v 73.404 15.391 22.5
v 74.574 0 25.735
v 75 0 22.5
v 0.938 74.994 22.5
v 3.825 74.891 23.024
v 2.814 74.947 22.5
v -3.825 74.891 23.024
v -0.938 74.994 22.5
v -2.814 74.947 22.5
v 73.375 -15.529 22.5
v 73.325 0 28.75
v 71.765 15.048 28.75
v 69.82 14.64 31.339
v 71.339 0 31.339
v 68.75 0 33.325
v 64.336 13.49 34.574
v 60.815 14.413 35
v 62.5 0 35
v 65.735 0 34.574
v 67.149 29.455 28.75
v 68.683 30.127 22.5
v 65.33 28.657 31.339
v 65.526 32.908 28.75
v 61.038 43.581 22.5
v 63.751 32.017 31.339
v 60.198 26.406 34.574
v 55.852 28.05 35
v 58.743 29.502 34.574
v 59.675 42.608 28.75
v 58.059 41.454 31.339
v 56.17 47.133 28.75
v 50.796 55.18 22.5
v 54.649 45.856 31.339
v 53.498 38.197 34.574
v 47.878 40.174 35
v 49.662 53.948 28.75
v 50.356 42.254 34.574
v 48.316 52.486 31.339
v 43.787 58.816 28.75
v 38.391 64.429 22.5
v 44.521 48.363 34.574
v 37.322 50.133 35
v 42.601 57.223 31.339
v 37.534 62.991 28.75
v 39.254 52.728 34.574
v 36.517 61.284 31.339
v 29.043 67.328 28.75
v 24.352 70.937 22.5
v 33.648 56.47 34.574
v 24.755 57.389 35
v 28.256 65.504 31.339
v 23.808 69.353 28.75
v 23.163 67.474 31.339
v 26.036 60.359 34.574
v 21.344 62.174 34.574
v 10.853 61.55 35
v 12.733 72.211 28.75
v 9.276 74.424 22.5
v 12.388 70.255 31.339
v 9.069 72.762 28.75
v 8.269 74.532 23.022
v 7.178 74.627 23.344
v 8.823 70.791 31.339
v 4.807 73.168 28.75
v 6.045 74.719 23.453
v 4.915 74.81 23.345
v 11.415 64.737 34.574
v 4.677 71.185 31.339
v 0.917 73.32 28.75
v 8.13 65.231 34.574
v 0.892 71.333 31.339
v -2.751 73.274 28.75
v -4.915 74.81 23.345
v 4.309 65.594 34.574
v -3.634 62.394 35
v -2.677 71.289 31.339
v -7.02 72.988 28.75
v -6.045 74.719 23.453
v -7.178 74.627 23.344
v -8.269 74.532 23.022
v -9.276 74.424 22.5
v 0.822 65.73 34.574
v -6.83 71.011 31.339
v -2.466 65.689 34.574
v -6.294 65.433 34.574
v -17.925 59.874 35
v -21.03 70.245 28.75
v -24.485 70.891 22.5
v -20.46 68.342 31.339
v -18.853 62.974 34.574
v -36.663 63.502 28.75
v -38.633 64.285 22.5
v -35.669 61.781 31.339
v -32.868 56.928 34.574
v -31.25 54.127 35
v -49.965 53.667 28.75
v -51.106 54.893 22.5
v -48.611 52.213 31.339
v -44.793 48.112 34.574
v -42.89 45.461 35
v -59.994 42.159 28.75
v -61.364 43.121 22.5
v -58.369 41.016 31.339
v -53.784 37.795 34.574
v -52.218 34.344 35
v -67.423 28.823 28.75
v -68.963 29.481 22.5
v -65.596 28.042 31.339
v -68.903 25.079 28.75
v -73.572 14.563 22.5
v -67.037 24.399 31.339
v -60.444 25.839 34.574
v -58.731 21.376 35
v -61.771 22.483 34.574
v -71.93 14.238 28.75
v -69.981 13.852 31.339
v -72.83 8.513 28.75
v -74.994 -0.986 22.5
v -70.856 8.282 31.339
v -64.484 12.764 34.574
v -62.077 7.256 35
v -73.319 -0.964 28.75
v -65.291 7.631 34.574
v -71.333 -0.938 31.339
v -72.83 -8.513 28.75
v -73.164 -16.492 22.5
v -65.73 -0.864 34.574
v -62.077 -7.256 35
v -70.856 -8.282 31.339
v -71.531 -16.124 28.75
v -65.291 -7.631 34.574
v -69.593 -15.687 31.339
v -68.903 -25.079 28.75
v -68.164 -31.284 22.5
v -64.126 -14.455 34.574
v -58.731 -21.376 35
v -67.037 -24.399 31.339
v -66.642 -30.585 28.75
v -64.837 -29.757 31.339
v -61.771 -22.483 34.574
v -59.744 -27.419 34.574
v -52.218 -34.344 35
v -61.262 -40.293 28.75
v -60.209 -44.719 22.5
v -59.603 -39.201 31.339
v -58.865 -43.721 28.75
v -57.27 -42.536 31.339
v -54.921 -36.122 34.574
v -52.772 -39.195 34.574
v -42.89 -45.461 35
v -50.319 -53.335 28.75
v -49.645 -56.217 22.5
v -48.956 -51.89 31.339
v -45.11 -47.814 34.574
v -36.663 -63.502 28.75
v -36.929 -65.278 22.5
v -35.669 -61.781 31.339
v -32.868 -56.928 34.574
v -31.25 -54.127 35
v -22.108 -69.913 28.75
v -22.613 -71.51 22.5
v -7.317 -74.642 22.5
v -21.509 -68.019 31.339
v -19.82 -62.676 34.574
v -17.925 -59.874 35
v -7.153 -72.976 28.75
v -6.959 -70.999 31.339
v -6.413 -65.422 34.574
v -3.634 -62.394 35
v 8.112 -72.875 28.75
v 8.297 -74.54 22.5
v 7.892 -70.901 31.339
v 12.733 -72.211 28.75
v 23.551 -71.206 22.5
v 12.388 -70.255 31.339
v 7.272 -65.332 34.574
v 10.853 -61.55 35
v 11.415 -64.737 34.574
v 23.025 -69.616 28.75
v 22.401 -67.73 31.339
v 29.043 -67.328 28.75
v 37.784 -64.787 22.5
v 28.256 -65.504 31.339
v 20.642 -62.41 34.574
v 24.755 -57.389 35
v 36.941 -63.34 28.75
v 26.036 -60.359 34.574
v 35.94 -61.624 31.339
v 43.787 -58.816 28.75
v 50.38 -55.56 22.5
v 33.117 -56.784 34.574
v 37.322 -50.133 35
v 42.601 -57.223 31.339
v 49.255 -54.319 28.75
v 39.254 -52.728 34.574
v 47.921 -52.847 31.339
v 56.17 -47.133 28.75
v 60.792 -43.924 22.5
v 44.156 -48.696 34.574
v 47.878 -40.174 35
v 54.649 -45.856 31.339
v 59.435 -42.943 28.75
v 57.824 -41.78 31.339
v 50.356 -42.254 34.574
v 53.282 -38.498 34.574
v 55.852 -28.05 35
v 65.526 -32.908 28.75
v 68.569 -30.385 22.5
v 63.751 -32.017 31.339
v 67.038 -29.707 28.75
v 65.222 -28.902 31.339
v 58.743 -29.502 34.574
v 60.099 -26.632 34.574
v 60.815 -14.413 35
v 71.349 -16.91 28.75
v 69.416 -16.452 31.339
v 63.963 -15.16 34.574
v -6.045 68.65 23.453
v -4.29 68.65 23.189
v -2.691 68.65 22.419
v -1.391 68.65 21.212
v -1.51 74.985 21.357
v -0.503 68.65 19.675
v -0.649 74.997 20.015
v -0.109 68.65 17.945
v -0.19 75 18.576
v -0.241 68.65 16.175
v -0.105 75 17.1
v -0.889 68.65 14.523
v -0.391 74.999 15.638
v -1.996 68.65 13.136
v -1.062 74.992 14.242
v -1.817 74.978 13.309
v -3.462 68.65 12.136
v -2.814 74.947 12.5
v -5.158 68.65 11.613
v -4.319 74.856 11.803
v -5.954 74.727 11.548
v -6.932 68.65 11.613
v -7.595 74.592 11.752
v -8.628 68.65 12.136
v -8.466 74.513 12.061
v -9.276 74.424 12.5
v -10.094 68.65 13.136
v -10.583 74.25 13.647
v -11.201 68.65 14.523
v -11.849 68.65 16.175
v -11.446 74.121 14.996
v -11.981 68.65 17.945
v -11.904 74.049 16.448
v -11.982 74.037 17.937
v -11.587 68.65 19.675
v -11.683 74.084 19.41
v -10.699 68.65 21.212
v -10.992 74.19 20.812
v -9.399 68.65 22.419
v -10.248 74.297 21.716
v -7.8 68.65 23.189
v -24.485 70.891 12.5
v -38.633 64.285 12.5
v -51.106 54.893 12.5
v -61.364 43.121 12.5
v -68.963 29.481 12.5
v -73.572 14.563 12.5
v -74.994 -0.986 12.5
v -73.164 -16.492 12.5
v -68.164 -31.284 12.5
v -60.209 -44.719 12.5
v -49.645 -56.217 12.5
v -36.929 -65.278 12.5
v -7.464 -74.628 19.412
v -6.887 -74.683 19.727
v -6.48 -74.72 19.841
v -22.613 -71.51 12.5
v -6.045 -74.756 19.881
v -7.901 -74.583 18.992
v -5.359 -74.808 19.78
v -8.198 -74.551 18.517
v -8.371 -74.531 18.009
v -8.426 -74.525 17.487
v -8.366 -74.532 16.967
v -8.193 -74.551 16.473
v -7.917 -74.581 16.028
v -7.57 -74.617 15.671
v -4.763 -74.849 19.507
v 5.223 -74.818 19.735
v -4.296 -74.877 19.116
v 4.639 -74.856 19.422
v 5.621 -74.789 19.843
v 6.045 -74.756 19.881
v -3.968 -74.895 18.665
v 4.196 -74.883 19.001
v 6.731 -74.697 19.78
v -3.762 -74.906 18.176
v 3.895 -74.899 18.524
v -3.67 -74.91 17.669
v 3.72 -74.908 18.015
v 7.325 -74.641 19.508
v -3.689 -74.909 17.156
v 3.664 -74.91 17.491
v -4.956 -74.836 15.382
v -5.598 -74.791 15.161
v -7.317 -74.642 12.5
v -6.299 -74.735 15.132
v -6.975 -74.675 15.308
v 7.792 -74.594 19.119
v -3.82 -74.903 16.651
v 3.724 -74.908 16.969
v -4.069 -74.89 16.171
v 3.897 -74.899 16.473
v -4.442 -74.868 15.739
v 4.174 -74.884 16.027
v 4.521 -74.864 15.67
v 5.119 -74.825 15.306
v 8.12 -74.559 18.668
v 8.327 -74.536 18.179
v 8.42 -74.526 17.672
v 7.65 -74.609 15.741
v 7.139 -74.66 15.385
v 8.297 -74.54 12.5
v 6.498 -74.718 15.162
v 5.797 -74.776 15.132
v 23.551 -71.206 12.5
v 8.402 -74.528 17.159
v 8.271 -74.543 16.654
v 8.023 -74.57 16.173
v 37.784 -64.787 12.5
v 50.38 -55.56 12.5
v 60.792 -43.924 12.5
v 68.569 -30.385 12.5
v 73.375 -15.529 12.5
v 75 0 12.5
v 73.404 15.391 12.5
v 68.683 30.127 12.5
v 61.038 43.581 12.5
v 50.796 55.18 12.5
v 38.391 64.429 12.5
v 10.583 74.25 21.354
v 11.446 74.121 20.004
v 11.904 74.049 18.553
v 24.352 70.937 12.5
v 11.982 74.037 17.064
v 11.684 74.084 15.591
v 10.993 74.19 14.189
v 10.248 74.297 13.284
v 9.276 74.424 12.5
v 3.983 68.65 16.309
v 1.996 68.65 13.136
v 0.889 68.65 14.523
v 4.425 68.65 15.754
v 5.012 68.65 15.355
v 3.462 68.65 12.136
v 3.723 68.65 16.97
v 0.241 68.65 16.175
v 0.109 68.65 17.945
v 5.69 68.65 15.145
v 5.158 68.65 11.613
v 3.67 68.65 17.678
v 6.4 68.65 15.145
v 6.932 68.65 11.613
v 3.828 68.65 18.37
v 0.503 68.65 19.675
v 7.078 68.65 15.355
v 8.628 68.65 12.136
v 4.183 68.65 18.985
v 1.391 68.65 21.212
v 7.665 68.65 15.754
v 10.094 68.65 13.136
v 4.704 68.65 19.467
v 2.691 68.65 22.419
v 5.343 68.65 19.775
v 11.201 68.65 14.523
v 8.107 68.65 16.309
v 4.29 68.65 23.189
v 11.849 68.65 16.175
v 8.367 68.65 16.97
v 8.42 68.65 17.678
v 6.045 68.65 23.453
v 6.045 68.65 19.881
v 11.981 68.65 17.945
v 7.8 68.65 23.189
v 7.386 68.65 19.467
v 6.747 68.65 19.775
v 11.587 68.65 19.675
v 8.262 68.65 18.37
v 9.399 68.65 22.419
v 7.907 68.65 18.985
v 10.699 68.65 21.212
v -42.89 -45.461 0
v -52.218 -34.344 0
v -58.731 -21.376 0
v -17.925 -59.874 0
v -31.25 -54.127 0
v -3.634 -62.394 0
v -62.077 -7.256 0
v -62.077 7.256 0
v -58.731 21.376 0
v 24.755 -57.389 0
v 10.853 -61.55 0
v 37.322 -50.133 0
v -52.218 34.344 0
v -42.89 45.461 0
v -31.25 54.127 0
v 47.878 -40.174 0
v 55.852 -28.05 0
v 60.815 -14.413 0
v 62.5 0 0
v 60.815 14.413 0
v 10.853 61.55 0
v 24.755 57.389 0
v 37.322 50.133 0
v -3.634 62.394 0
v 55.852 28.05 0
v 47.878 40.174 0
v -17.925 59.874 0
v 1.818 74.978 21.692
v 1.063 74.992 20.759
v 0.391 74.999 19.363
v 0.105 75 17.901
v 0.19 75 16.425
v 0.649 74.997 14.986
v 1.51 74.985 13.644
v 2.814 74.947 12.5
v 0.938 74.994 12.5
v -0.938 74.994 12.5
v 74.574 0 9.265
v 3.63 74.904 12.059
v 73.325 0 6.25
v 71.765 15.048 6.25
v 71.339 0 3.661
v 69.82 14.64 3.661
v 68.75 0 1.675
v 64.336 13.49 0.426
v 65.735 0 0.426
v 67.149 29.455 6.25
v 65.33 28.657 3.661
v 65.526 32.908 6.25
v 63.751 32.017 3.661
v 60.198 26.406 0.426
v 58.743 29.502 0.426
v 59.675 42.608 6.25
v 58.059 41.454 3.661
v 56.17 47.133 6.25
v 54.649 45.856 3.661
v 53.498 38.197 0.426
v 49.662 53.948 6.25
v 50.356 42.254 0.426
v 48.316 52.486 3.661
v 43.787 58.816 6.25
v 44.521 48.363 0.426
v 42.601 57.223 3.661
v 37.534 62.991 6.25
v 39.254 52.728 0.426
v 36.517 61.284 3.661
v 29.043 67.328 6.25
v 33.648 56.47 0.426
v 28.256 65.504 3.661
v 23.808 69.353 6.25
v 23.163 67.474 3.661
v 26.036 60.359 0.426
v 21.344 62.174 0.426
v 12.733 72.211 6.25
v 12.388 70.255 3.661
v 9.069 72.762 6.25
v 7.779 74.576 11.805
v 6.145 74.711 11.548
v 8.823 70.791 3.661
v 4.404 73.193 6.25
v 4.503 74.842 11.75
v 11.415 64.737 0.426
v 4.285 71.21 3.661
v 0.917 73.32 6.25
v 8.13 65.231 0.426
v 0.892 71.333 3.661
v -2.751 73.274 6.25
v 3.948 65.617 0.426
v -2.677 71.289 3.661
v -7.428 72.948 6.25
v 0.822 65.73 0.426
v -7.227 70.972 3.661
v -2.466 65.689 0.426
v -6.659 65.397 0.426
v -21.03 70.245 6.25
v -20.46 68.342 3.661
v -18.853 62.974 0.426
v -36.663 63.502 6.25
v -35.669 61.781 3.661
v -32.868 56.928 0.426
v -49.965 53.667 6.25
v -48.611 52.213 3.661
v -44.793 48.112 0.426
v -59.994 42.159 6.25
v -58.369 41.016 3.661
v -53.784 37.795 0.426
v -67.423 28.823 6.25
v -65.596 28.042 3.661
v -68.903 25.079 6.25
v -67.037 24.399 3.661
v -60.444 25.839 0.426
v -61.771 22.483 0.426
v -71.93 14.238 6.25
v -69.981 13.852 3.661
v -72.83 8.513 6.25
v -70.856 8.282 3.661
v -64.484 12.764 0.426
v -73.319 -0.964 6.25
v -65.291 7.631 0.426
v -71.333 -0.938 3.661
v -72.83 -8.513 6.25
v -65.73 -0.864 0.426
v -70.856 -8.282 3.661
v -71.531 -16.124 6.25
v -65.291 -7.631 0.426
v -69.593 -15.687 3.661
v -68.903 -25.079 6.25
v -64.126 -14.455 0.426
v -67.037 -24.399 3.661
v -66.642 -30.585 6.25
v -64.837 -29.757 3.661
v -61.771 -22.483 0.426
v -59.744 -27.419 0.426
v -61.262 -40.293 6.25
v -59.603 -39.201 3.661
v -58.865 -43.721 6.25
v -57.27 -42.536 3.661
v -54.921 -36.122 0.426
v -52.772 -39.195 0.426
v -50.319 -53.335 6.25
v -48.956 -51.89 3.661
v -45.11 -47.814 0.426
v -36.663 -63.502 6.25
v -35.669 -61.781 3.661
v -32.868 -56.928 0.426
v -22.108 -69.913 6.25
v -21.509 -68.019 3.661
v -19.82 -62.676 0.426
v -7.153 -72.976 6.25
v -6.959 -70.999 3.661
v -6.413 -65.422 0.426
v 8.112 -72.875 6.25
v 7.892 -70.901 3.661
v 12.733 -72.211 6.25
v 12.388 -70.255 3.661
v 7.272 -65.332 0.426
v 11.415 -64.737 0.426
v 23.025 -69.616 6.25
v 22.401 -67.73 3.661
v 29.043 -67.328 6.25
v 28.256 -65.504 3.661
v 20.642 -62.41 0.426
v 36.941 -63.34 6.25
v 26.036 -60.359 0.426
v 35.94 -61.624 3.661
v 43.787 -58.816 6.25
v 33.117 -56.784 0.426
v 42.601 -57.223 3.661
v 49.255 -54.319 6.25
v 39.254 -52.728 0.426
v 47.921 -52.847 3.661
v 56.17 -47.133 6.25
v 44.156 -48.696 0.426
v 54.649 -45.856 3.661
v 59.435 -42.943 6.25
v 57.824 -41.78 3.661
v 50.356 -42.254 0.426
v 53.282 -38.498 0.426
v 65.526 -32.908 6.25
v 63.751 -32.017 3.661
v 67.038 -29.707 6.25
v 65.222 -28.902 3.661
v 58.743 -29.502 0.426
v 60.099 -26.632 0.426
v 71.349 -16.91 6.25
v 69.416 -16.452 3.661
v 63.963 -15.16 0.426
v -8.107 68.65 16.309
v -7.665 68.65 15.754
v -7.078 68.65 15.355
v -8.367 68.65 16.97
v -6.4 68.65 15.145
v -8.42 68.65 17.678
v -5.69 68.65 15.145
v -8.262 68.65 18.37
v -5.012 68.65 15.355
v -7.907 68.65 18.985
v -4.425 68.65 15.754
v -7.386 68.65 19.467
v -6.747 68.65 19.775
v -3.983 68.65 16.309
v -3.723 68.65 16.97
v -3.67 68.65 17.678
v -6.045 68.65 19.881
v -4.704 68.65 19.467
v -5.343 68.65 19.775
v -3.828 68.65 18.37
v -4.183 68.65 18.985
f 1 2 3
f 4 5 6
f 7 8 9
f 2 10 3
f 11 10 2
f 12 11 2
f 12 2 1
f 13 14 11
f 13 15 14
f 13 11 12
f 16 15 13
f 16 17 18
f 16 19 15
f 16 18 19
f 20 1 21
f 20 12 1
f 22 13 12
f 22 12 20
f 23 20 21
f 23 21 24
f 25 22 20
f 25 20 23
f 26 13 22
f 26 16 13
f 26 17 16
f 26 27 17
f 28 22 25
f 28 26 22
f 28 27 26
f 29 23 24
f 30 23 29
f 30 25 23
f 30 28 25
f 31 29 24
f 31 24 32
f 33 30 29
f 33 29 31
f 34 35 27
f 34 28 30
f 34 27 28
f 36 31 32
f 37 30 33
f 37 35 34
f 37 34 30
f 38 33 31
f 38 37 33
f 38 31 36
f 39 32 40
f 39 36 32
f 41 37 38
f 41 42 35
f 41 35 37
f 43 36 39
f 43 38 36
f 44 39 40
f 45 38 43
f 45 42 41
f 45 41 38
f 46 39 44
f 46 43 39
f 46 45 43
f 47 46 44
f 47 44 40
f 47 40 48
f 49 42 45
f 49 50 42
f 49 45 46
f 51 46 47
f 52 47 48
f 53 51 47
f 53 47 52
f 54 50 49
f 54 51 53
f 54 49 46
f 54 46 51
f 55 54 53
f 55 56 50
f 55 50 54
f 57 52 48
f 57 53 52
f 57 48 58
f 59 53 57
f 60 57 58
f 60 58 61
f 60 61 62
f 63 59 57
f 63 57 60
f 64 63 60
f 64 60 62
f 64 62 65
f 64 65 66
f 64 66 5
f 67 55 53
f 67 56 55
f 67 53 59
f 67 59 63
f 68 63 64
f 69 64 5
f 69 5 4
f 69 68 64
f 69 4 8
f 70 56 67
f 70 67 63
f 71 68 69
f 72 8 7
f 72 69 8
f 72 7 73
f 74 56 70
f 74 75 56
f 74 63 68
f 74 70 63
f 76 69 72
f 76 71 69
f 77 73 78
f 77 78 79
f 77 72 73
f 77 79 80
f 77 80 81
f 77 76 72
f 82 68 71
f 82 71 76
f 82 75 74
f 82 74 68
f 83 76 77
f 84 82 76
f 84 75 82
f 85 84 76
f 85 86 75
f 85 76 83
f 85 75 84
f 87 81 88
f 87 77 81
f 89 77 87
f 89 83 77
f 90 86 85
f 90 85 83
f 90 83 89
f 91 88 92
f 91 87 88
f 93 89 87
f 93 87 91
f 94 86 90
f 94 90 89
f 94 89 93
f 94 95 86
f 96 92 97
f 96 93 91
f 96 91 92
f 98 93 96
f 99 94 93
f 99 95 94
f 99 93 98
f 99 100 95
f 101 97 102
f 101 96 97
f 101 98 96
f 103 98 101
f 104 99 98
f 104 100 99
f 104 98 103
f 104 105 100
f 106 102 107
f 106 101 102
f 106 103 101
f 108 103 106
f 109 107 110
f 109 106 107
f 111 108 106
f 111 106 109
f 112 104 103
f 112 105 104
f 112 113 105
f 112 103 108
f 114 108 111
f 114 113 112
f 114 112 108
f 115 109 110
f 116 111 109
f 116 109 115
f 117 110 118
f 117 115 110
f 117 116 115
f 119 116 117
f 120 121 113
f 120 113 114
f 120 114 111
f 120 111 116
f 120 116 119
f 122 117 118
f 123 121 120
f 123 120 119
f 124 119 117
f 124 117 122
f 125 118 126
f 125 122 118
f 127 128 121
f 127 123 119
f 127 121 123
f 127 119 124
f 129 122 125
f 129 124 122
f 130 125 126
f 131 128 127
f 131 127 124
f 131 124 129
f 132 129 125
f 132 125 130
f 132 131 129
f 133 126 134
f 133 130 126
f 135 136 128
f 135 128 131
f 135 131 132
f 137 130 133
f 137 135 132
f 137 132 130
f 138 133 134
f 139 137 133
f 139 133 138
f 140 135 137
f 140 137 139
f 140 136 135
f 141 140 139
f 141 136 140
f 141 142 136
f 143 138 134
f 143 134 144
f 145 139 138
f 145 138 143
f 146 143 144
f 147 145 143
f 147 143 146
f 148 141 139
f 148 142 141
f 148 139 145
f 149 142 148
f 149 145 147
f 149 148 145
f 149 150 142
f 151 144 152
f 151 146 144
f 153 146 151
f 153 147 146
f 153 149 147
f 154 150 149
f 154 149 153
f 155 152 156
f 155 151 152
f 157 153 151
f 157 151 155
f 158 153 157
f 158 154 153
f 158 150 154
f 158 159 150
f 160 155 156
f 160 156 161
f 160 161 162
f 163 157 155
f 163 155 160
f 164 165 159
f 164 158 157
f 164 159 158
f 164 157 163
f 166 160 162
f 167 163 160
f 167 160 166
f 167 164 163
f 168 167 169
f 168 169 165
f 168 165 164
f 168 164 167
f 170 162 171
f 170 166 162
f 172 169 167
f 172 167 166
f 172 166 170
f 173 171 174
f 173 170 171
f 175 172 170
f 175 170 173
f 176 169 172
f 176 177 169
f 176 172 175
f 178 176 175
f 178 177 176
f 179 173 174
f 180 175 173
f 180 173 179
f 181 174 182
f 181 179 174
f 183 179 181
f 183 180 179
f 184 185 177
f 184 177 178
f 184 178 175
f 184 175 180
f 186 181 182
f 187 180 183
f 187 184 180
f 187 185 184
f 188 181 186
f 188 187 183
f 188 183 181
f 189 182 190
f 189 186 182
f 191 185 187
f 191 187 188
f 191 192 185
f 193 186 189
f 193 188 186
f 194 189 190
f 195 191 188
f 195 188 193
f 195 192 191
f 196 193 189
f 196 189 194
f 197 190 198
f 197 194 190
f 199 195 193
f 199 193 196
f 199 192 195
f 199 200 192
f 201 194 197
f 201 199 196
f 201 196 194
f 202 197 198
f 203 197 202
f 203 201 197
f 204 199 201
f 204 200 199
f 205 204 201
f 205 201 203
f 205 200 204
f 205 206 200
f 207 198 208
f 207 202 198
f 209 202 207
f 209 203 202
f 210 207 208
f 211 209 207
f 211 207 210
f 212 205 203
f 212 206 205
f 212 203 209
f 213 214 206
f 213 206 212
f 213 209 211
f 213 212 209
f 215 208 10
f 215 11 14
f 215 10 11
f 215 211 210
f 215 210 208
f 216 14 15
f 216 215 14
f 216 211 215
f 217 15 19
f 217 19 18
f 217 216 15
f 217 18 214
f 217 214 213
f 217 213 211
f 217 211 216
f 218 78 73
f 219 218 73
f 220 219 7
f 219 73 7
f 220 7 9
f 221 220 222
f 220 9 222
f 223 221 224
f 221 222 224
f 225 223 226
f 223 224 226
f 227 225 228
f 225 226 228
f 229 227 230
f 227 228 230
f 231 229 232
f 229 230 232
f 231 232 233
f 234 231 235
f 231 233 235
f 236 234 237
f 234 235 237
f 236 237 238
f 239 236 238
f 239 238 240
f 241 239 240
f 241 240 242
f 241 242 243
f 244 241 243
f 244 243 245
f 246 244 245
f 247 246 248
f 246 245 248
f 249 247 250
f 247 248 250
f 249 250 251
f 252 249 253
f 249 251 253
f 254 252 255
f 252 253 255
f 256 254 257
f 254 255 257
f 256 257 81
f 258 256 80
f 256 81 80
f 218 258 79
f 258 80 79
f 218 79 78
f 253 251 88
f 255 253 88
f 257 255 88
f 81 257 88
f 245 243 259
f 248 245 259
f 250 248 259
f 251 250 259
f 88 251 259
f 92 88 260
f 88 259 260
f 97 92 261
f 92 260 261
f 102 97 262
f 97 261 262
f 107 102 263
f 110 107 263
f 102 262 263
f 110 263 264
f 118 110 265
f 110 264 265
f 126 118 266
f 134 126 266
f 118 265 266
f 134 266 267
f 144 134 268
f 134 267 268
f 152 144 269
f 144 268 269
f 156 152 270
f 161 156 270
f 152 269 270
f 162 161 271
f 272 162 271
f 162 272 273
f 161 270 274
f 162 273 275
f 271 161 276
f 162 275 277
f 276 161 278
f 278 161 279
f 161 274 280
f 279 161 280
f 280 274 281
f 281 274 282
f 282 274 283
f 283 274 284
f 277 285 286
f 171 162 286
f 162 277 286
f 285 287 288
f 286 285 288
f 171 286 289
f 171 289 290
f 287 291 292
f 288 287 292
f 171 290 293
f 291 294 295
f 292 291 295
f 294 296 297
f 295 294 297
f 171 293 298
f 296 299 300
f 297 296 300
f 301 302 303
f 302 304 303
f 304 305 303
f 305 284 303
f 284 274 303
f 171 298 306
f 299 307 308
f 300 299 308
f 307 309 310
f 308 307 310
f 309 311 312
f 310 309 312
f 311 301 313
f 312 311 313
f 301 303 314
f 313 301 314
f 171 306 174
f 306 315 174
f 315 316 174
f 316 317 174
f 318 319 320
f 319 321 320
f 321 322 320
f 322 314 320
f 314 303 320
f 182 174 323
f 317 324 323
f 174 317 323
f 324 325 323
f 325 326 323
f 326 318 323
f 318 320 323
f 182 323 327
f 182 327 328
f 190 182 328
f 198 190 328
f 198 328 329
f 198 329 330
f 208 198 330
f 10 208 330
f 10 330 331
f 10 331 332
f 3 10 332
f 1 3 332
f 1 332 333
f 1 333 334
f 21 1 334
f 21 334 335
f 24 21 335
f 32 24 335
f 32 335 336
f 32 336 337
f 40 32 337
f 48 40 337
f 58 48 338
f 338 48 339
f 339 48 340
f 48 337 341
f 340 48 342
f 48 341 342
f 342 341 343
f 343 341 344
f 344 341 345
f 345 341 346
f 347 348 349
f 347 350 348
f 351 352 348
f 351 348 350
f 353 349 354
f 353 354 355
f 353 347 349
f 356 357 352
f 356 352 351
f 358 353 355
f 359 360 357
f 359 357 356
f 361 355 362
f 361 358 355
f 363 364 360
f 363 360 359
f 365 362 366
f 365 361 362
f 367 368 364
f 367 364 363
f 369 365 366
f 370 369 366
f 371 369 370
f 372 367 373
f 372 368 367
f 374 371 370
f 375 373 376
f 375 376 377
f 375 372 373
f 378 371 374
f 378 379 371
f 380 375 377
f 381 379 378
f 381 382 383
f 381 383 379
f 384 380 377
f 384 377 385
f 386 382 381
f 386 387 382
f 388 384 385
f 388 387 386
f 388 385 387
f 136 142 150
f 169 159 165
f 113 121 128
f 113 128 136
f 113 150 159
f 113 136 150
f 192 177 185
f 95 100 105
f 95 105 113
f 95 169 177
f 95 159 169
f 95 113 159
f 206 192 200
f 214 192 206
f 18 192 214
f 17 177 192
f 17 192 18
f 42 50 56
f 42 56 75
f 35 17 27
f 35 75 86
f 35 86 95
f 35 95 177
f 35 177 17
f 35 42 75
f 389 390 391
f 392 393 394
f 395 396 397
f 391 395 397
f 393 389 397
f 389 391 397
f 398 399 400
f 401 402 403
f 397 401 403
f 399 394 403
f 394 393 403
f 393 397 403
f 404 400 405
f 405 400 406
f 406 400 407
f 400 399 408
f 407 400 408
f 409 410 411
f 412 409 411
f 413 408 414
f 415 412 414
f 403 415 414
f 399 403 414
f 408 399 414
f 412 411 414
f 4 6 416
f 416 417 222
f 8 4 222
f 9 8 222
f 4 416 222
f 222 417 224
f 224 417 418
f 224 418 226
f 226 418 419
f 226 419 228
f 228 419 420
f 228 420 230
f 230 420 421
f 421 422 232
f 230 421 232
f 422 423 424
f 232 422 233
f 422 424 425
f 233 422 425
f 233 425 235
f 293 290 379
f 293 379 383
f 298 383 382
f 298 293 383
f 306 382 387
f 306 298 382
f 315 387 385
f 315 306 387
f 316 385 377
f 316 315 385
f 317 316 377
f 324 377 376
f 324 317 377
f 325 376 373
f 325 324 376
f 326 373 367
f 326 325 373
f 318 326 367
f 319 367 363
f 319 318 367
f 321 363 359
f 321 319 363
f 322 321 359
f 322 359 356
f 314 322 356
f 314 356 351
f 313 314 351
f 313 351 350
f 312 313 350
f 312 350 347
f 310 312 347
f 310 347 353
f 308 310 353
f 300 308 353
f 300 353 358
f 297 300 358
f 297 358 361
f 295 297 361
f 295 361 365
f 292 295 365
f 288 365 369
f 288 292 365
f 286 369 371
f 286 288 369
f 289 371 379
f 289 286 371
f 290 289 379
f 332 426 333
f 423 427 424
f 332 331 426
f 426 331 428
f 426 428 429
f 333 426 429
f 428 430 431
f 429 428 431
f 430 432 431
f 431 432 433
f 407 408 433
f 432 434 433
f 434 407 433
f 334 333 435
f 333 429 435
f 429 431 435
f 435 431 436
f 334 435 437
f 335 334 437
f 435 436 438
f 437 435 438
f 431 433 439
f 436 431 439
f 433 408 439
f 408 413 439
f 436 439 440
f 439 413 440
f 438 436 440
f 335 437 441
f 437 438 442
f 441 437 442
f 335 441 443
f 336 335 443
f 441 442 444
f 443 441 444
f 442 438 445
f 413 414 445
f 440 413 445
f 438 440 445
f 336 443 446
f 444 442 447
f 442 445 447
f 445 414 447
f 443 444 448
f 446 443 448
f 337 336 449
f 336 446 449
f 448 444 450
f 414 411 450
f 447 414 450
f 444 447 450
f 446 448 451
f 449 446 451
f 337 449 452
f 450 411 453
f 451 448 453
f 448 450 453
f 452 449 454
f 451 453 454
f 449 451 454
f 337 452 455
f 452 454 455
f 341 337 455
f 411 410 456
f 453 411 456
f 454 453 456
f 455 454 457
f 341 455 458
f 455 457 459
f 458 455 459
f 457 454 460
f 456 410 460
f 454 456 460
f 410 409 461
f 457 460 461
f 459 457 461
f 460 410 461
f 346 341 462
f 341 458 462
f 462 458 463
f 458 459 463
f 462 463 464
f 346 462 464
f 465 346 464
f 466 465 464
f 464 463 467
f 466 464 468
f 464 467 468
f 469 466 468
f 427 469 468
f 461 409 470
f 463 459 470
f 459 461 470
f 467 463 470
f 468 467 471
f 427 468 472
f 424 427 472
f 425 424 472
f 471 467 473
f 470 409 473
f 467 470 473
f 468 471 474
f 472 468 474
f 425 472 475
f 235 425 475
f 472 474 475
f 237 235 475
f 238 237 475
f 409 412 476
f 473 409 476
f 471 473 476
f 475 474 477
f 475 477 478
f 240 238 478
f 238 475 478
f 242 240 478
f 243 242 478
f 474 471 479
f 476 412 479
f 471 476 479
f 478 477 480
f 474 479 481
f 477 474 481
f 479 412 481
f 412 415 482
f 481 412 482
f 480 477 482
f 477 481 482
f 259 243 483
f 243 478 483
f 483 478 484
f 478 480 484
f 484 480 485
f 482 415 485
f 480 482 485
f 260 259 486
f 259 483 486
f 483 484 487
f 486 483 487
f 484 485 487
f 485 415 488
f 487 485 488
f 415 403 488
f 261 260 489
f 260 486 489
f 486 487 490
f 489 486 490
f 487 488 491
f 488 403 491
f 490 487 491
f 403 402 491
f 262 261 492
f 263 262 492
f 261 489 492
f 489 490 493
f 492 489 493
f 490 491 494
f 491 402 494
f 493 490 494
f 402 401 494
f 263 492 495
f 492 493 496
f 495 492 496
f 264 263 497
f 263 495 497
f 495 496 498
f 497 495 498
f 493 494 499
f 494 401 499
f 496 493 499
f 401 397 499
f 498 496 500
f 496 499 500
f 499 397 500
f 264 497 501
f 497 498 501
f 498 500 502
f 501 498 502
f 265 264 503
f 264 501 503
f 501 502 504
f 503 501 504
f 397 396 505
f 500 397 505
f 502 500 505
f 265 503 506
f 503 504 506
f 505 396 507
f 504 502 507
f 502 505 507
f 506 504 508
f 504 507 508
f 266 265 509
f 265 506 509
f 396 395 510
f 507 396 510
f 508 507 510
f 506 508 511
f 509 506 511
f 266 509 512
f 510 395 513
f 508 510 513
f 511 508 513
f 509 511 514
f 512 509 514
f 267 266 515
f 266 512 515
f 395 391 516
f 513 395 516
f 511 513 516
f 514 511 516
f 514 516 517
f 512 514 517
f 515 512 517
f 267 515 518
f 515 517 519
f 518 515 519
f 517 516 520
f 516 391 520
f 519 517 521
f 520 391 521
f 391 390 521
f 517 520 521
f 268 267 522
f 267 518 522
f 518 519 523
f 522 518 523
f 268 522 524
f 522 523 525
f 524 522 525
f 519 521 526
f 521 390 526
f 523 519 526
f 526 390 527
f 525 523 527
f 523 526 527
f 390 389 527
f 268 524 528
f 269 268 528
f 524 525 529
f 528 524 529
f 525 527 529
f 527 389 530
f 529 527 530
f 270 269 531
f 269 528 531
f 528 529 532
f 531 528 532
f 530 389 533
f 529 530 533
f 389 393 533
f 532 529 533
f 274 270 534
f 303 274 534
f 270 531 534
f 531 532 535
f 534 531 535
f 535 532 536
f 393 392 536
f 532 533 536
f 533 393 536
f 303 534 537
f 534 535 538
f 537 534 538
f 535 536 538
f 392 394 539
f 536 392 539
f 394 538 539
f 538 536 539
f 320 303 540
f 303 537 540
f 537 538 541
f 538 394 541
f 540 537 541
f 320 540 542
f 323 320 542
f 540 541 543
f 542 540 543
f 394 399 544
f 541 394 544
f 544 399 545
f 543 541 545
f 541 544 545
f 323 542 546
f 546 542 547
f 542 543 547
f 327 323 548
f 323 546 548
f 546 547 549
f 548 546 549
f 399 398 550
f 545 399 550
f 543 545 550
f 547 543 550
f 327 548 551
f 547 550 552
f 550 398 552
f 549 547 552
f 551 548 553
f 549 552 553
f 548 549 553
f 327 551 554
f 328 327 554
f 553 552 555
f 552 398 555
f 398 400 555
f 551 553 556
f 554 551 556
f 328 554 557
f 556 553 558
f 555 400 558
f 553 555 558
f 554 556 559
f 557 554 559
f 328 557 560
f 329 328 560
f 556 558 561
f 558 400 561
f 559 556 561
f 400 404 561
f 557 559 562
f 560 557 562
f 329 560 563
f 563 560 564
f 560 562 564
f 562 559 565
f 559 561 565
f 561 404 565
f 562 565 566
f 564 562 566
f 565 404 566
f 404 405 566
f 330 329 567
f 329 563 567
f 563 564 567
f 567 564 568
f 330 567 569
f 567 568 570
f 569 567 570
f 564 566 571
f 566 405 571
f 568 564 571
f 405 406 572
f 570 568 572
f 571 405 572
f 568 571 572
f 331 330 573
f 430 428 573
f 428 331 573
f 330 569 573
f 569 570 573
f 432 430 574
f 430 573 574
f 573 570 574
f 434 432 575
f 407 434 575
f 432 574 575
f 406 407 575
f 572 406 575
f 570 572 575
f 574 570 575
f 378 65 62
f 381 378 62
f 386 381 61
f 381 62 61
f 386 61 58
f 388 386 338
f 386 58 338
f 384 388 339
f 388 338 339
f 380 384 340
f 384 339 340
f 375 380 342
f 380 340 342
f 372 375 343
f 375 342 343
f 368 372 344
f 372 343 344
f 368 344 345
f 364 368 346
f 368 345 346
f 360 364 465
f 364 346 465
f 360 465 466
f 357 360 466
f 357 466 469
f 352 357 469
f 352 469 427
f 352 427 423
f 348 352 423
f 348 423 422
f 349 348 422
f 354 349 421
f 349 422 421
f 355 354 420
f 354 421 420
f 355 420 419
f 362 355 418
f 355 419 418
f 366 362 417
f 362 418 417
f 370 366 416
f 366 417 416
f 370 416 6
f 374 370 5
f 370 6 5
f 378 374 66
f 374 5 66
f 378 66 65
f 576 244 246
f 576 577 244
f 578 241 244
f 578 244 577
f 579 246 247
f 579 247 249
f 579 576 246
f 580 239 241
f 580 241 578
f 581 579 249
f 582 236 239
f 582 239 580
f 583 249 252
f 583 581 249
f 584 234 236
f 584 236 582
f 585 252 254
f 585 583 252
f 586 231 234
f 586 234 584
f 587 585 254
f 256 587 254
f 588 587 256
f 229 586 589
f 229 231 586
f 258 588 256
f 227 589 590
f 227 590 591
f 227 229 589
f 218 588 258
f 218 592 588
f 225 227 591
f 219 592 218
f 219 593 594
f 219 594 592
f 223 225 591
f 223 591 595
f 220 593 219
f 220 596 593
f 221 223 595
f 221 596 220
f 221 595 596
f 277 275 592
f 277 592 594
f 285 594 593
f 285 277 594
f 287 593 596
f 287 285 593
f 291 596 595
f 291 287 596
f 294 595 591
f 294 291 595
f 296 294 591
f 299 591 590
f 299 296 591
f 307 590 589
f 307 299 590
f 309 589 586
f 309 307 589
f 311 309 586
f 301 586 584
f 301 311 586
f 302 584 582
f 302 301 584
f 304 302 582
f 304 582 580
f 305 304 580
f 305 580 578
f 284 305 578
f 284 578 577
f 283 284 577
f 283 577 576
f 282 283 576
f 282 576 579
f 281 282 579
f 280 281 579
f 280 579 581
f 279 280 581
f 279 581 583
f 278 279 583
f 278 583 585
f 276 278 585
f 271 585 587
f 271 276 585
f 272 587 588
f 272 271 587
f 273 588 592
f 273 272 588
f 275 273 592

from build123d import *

# Parameters (mm, degrees)
SKETCH1_R               = 75
BOSS_EXTRUDE1_DEPTH     = 35
CUT_EXTRUDE1_DEPTH      = 112.691539518
CUT_EXTRUDE1_DEPTH_BACK = 112.691539518
SKETCH2_R               = 2.38125
FILLET1_R               = 12.5
SKETCH3_R               = 5.953125
CUT_EXTRUDE2_DEPTH      = 6.35


with BuildPart() as part:
    # Sketch1 → Boss-Extrude1 (new body)
    with BuildSketch(Plane.XY):
        Circle(SKETCH1_R)
    extrude(amount=BOSS_EXTRUDE1_DEPTH)

    # Sketch2 → Cut-Extrude1 (cut, two sides: drawn at the far end of the back side and taken through both)
    with BuildSketch(Plane(origin=(0, 0, 0), x_dir=(1, 0, 0), z_dir=(0, 1, 0)).offset(-CUT_EXTRUDE1_DEPTH_BACK)):
        with Locations(Location((-6.045, -17.5, 0), (0, 0, 270))):
            Circle(SKETCH2_R)
        with Locations(Location((6.045, -17.5, 0), (0, 0, 270))):
            Circle(SKETCH2_R)
    extrude(amount=CUT_EXTRUDE1_DEPTH + CUT_EXTRUDE1_DEPTH_BACK, mode=Mode.SUBTRACT)

    # Fillet1
    fillet1_edges = [part.edges().sort_by_distance(p)[0] for p in [
        (-75, 0, 0),
        (-75, 0, 35),
    ]]
    fillet(fillet1_edges, radius=FILLET1_R)

    # Sketch3 → Cut-Extrude2 (cut)
    with BuildSketch(Plane(origin=(0, 75, 0), x_dir=(1, 0, 0), z_dir=(0, 1, 0))):
        with Locations(Location((-6.045, -17.5, 0), (0, 0, 270))):
            Circle(SKETCH3_R)
        with Locations(Location((6.045, -17.5, 0), (0, 0, 270))):
            Circle(SKETCH3_R)
    extrude(amount=-CUT_EXTRUDE2_DEPTH, mode=Mode.SUBTRACT)


solid = part.part
